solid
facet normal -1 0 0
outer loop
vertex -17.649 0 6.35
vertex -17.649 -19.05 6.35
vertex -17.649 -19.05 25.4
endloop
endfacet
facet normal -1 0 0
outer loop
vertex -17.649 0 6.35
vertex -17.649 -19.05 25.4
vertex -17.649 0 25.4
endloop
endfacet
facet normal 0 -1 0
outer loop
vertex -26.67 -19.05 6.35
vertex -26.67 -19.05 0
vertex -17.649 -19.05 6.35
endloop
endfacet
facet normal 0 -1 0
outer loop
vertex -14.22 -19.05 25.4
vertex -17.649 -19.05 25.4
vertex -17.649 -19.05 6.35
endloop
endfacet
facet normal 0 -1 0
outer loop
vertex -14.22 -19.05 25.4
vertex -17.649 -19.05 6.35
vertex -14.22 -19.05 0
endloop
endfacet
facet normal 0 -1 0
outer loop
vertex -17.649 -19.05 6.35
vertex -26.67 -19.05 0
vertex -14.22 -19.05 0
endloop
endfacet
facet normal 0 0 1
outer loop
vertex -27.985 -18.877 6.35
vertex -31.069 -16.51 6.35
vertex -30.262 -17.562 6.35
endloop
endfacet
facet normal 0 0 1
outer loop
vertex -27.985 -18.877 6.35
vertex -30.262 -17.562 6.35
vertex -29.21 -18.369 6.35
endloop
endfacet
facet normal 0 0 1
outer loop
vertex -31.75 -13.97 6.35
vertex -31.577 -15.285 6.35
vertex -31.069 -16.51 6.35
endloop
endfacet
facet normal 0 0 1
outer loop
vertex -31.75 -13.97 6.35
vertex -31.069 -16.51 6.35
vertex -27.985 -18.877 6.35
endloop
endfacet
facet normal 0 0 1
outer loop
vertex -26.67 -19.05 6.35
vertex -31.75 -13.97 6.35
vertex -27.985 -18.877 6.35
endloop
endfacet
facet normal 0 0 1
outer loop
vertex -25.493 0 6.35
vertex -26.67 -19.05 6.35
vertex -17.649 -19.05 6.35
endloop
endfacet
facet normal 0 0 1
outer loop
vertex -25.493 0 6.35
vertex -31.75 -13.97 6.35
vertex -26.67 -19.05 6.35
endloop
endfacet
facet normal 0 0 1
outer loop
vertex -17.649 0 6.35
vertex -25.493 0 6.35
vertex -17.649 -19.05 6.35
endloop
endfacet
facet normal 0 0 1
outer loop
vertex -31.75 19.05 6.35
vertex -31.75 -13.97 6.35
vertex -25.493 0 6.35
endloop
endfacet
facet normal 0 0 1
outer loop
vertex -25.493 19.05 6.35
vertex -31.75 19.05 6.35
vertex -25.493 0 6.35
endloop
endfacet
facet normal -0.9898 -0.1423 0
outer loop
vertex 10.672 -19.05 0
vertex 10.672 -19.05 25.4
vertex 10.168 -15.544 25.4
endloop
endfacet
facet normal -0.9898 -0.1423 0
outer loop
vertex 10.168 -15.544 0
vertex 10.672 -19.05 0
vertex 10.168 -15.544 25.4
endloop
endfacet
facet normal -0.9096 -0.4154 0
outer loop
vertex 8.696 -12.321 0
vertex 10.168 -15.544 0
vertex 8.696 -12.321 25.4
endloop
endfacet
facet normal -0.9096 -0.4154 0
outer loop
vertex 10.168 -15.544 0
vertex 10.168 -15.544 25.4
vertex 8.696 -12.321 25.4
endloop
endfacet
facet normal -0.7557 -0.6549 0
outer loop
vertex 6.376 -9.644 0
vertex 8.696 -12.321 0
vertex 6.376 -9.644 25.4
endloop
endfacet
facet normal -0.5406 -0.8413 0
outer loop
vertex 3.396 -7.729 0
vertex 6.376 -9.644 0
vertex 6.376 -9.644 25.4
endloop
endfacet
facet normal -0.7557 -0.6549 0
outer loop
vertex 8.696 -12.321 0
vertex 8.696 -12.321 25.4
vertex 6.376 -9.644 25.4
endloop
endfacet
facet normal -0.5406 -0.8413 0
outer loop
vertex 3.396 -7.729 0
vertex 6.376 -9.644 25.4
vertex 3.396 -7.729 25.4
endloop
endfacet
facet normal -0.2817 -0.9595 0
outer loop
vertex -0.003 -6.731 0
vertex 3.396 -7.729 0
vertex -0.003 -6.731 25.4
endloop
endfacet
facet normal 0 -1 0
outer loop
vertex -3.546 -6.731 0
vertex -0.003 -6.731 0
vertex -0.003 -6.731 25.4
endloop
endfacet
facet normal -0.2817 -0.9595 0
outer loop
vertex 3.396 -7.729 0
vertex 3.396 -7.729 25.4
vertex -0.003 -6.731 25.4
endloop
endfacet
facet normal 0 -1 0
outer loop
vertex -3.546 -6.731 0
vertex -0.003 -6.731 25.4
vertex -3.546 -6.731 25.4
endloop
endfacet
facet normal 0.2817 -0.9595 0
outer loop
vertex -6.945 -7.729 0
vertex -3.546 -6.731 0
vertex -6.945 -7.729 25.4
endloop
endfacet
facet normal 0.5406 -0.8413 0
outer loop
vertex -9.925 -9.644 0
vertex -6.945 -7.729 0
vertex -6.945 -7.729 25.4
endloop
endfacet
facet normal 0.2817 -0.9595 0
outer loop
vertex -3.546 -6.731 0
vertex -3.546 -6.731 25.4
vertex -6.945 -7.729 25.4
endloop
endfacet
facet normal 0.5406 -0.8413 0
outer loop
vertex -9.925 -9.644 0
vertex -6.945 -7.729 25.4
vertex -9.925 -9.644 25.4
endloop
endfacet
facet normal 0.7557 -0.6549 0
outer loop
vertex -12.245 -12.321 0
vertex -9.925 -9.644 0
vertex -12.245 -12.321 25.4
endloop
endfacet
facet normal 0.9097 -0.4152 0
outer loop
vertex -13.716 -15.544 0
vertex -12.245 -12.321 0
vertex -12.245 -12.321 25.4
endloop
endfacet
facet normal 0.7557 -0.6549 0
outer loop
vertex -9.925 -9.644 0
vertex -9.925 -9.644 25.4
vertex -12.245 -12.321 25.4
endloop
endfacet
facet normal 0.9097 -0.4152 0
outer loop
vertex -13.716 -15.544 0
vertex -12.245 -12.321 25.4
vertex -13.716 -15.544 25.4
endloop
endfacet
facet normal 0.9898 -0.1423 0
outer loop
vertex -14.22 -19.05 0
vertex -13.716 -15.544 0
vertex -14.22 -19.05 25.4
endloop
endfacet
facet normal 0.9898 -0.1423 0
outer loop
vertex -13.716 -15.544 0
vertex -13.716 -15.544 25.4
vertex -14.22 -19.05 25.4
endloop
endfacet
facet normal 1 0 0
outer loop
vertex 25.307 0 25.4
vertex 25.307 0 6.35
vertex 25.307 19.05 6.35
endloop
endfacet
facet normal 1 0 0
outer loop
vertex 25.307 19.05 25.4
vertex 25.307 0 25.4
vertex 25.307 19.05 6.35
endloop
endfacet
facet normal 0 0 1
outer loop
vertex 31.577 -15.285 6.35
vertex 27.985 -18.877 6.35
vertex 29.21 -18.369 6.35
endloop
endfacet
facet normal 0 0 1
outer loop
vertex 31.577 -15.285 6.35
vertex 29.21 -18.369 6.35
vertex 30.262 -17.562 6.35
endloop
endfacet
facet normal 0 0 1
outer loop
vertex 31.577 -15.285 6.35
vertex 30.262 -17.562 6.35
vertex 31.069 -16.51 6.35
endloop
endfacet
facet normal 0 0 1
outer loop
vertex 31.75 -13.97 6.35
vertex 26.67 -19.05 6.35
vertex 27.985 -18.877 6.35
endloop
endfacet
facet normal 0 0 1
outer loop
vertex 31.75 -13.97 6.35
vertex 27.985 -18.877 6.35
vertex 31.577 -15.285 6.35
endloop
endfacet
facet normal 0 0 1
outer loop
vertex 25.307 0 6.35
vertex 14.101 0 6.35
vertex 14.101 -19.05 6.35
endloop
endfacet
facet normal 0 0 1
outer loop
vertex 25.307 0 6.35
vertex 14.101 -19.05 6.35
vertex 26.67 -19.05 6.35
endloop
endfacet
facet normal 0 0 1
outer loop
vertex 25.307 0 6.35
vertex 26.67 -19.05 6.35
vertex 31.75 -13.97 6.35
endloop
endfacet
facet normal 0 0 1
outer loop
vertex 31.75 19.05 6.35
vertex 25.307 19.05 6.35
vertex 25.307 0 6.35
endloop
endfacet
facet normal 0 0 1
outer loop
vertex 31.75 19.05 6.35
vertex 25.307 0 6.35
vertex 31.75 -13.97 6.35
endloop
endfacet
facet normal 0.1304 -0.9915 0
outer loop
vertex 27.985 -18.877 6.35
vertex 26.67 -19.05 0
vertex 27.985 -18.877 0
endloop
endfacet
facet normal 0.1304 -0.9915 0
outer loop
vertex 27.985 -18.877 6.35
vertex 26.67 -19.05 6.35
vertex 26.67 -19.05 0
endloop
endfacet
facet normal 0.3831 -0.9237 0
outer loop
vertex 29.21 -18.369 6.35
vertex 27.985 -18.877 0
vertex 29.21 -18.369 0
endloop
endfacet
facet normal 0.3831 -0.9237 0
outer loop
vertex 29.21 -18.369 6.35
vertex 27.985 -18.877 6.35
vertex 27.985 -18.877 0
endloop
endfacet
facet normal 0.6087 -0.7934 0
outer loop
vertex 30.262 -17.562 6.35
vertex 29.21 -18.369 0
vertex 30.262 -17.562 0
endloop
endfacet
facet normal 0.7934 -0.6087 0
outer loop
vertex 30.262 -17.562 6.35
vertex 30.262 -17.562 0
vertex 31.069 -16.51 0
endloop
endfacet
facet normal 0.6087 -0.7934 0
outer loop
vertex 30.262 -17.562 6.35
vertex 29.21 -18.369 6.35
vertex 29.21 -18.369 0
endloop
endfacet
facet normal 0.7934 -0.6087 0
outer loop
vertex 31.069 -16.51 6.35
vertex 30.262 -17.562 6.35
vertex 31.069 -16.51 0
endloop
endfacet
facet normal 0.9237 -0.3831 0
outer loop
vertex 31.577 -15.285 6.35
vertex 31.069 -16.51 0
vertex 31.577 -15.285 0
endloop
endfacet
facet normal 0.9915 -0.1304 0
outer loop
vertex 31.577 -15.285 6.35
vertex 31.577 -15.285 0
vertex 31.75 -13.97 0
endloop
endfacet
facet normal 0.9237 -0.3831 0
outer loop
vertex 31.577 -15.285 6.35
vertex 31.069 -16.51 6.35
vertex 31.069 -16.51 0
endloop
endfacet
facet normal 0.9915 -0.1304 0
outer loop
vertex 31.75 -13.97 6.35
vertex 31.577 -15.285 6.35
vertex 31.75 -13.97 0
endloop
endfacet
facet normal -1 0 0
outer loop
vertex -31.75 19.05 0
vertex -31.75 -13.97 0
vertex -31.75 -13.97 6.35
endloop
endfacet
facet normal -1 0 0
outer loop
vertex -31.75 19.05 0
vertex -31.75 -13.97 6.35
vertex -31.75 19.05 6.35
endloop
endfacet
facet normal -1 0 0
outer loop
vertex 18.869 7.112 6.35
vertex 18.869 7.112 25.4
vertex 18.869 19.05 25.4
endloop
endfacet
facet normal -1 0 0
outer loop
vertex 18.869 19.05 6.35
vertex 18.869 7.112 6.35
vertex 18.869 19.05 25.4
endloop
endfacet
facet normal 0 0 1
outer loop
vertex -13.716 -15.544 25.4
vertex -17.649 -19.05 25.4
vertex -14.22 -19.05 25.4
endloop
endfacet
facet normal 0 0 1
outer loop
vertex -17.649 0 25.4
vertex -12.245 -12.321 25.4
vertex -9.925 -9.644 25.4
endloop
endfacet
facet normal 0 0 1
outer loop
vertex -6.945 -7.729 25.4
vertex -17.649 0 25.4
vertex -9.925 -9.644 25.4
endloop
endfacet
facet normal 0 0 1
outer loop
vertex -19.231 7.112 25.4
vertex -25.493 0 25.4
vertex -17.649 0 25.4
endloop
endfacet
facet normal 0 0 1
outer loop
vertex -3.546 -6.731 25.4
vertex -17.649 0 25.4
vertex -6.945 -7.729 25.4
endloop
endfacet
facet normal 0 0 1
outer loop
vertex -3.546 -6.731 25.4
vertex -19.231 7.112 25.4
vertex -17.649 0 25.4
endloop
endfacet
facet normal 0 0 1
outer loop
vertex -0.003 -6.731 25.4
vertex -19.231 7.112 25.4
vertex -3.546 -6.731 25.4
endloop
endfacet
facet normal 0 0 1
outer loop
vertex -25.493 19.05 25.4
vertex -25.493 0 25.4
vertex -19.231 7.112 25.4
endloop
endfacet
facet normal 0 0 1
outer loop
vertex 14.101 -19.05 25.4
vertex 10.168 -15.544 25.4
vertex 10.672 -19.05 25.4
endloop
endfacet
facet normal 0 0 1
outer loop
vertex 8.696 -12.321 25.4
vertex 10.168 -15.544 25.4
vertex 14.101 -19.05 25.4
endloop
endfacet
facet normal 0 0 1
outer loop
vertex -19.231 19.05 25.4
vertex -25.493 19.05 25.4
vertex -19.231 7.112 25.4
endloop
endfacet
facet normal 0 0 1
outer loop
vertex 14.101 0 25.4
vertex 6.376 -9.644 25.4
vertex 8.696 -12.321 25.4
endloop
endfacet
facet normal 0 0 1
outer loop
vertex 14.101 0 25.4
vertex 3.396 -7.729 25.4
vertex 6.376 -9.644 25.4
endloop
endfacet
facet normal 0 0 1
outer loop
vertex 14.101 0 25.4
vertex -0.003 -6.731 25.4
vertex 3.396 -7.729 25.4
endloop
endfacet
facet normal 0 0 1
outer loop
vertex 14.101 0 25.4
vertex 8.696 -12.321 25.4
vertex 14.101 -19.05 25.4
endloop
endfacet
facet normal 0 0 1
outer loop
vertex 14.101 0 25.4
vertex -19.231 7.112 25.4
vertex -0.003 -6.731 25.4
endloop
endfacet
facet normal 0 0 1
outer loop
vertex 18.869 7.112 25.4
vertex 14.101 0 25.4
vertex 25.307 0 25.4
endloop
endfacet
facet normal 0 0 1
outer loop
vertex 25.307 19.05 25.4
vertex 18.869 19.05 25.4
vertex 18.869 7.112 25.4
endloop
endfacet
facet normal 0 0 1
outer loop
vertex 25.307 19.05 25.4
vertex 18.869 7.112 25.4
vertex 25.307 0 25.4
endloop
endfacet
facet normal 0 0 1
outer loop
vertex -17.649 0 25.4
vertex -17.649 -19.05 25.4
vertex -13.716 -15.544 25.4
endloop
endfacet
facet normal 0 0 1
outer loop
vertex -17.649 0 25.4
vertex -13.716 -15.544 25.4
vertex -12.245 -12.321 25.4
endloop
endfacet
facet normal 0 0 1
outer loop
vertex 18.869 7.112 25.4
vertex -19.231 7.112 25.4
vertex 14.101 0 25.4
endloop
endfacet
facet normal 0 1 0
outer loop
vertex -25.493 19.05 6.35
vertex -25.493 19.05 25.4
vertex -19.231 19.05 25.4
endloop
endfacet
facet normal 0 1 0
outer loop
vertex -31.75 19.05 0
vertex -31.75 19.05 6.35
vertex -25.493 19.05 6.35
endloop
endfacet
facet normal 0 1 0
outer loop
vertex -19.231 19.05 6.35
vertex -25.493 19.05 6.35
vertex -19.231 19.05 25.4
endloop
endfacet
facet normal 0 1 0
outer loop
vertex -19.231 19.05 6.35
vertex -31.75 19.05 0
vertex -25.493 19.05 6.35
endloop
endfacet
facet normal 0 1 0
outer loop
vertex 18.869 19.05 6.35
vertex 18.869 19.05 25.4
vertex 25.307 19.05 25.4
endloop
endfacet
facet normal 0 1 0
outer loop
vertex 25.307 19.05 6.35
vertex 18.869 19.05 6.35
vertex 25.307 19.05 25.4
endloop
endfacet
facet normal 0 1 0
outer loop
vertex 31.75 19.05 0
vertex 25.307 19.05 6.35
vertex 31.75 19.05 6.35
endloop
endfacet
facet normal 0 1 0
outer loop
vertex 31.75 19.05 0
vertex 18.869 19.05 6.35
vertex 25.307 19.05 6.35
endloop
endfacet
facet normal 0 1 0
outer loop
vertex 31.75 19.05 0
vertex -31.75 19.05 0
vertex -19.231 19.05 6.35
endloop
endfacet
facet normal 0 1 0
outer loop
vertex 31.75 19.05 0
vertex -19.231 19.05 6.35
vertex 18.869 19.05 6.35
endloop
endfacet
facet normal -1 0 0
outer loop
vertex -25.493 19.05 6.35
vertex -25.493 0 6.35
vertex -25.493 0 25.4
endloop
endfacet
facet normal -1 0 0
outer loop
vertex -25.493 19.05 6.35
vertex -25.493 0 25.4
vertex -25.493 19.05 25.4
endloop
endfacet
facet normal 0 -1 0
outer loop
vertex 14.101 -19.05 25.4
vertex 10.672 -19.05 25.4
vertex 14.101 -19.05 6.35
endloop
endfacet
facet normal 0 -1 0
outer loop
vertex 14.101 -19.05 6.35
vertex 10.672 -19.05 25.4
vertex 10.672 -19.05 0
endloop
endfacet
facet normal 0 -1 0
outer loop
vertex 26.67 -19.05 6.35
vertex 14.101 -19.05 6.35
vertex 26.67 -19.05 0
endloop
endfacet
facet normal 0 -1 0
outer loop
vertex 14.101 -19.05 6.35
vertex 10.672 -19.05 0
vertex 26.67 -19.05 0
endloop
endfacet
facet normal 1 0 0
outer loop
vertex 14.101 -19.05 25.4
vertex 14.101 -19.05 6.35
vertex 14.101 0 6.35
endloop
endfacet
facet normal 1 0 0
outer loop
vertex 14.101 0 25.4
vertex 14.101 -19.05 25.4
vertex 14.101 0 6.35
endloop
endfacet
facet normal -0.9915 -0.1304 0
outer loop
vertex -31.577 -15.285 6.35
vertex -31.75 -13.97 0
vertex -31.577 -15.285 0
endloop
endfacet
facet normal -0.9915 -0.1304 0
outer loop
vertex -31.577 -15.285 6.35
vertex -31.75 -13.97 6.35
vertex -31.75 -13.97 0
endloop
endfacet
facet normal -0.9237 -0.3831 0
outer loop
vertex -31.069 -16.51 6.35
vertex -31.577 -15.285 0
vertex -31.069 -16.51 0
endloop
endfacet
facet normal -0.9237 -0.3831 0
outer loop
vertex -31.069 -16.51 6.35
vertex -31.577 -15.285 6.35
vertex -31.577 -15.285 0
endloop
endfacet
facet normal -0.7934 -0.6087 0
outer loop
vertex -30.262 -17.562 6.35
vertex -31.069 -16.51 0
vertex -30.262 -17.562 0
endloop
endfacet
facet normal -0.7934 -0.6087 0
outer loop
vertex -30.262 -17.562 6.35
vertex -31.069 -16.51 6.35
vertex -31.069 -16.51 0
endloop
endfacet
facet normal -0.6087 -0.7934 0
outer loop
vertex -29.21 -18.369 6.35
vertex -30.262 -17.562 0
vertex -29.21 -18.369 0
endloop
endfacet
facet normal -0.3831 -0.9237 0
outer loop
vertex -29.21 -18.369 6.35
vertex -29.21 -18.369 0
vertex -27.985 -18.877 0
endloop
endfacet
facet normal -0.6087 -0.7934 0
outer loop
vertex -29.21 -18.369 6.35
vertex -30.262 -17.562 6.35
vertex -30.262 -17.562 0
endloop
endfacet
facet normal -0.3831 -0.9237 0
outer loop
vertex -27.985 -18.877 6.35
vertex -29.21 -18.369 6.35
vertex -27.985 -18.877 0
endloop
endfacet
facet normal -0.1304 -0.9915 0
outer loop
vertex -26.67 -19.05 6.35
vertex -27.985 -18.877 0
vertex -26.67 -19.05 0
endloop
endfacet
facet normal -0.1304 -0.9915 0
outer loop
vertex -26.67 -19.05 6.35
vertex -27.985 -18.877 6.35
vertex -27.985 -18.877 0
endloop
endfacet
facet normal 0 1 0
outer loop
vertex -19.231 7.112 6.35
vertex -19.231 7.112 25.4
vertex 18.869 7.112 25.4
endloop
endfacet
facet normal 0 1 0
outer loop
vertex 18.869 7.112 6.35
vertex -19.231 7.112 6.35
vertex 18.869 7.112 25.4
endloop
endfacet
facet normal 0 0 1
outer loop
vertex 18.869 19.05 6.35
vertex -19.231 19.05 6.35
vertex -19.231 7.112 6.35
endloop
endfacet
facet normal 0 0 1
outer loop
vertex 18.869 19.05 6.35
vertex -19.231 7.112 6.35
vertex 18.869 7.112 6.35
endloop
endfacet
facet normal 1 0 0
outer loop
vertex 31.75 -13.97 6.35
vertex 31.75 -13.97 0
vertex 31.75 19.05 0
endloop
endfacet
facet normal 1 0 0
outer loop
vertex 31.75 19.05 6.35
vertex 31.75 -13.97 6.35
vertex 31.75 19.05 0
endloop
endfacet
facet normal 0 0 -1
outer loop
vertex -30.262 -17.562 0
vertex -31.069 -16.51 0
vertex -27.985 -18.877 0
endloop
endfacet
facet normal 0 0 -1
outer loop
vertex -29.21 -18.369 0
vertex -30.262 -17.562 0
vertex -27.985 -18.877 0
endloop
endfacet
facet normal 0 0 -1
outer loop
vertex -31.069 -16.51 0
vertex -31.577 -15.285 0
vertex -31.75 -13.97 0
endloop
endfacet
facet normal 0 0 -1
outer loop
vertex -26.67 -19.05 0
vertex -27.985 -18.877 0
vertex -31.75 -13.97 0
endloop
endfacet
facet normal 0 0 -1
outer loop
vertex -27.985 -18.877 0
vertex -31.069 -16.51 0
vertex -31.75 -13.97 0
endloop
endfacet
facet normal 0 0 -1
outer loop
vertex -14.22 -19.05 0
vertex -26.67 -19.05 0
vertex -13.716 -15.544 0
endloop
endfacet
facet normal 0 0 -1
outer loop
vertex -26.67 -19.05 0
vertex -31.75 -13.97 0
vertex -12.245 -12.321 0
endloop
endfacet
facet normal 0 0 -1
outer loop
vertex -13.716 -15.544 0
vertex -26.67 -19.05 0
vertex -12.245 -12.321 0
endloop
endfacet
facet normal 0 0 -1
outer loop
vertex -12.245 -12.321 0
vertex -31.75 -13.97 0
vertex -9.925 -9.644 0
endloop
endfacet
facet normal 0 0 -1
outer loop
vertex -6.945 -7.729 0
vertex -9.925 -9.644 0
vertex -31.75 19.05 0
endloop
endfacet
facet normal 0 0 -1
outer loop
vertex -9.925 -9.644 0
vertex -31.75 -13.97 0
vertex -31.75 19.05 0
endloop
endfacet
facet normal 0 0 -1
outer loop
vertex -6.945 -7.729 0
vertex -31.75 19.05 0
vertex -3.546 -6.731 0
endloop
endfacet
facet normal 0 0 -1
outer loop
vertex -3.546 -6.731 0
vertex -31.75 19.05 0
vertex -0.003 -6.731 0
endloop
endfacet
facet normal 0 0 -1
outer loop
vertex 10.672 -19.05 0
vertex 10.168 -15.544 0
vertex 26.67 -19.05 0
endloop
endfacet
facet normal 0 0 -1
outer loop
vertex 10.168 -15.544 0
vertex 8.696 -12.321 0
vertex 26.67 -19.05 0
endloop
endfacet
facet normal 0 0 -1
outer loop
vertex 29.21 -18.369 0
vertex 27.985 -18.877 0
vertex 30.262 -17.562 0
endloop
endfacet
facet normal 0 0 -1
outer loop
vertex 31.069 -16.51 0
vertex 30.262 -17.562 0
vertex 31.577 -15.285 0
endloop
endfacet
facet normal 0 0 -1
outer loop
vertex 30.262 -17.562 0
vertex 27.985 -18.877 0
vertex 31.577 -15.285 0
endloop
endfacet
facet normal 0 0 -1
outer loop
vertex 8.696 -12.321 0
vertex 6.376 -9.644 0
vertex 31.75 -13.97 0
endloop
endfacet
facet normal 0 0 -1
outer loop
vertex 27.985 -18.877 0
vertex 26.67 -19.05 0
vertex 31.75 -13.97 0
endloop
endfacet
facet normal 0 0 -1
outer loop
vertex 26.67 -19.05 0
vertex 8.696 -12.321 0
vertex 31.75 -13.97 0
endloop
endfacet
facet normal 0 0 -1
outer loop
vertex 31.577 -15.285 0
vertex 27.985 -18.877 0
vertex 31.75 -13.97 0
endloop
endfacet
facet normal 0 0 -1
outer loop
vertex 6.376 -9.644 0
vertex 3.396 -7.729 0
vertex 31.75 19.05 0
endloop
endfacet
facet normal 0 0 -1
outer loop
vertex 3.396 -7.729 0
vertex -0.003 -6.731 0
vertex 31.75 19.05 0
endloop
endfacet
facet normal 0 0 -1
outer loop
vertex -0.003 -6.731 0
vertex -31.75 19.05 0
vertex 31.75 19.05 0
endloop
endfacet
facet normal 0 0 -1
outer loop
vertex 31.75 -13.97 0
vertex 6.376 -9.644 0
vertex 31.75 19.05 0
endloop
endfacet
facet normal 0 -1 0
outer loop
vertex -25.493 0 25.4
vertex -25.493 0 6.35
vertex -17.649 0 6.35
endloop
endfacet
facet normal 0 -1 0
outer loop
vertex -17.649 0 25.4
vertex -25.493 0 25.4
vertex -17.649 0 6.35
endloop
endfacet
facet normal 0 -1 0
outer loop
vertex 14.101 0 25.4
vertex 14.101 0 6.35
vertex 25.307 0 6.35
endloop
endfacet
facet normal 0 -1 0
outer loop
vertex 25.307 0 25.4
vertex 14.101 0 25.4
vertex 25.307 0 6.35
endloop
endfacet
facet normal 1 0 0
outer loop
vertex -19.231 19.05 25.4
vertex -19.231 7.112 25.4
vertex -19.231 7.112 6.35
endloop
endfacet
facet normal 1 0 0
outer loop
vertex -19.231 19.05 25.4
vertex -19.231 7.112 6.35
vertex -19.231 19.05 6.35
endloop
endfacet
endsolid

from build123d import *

# Parameters (mm, degrees)
F0_W      = 63.5
F0_H      = 38.1
F1_DEPTH  = 6.35
F2_W      = 50.8
F2_H      = 19.05
F3_DEPTH  = 19.05
F4_W      = 38.1
F4_H      = 11.938
F5_DEPTH  = 19.05
F6_R      = 5.08
F7_W      = 31.75
F7_H      = 19.05
F8_DEPTH  = 19.05
F9_R      = 12.446
F10_DEPTH = 25.401


with BuildPart() as f1:
    # F0 (on Top) → F1 (new body)
    with BuildSketch(Plane.XY):
        Rectangle(F0_W, F0_H)
    extrude(amount=F1_DEPTH)

    # F2 (on face) → F3 (join)
    with BuildSketch(Plane.XY.offset(6.35)):
        with Locations((-0.093382, 9.525)):
            Rectangle(F2_W, F2_H)
    extrude(amount=F3_DEPTH)

    # F4 (on face) → F5 (cut)
    with BuildSketch(Plane.XY.offset(25.4)):
        with Locations((-0.18145, 13.081)):
            Rectangle(F4_W, F4_H)
    extrude(amount=-F5_DEPTH, mode=Mode.SUBTRACT)

    # F6
    f6_edges = [f1.edges().sort_by_distance(p)[0] for p in [
        (-31.75, -19.05, 3.175),
        (31.75, -19.05, 3.175),
    ]]
    fillet(f6_edges, radius=F6_R)

    # F7 (on face) → F8 (join)
    with BuildSketch(Plane.XY.offset(6.35)):
        with Locations((-1.774265, -9.525)):
            Rectangle(F7_W, F7_H)
    extrude(amount=F8_DEPTH)

    # F9 (on face) → F10 (cut, through all)
    with BuildSketch(Plane.XY.offset(25.4)):
        with Locations((-1.774265, -19.05)):
            Circle(F9_R)
    extrude(amount=-F10_DEPTH, mode=Mode.SUBTRACT)


solid = f1.part
